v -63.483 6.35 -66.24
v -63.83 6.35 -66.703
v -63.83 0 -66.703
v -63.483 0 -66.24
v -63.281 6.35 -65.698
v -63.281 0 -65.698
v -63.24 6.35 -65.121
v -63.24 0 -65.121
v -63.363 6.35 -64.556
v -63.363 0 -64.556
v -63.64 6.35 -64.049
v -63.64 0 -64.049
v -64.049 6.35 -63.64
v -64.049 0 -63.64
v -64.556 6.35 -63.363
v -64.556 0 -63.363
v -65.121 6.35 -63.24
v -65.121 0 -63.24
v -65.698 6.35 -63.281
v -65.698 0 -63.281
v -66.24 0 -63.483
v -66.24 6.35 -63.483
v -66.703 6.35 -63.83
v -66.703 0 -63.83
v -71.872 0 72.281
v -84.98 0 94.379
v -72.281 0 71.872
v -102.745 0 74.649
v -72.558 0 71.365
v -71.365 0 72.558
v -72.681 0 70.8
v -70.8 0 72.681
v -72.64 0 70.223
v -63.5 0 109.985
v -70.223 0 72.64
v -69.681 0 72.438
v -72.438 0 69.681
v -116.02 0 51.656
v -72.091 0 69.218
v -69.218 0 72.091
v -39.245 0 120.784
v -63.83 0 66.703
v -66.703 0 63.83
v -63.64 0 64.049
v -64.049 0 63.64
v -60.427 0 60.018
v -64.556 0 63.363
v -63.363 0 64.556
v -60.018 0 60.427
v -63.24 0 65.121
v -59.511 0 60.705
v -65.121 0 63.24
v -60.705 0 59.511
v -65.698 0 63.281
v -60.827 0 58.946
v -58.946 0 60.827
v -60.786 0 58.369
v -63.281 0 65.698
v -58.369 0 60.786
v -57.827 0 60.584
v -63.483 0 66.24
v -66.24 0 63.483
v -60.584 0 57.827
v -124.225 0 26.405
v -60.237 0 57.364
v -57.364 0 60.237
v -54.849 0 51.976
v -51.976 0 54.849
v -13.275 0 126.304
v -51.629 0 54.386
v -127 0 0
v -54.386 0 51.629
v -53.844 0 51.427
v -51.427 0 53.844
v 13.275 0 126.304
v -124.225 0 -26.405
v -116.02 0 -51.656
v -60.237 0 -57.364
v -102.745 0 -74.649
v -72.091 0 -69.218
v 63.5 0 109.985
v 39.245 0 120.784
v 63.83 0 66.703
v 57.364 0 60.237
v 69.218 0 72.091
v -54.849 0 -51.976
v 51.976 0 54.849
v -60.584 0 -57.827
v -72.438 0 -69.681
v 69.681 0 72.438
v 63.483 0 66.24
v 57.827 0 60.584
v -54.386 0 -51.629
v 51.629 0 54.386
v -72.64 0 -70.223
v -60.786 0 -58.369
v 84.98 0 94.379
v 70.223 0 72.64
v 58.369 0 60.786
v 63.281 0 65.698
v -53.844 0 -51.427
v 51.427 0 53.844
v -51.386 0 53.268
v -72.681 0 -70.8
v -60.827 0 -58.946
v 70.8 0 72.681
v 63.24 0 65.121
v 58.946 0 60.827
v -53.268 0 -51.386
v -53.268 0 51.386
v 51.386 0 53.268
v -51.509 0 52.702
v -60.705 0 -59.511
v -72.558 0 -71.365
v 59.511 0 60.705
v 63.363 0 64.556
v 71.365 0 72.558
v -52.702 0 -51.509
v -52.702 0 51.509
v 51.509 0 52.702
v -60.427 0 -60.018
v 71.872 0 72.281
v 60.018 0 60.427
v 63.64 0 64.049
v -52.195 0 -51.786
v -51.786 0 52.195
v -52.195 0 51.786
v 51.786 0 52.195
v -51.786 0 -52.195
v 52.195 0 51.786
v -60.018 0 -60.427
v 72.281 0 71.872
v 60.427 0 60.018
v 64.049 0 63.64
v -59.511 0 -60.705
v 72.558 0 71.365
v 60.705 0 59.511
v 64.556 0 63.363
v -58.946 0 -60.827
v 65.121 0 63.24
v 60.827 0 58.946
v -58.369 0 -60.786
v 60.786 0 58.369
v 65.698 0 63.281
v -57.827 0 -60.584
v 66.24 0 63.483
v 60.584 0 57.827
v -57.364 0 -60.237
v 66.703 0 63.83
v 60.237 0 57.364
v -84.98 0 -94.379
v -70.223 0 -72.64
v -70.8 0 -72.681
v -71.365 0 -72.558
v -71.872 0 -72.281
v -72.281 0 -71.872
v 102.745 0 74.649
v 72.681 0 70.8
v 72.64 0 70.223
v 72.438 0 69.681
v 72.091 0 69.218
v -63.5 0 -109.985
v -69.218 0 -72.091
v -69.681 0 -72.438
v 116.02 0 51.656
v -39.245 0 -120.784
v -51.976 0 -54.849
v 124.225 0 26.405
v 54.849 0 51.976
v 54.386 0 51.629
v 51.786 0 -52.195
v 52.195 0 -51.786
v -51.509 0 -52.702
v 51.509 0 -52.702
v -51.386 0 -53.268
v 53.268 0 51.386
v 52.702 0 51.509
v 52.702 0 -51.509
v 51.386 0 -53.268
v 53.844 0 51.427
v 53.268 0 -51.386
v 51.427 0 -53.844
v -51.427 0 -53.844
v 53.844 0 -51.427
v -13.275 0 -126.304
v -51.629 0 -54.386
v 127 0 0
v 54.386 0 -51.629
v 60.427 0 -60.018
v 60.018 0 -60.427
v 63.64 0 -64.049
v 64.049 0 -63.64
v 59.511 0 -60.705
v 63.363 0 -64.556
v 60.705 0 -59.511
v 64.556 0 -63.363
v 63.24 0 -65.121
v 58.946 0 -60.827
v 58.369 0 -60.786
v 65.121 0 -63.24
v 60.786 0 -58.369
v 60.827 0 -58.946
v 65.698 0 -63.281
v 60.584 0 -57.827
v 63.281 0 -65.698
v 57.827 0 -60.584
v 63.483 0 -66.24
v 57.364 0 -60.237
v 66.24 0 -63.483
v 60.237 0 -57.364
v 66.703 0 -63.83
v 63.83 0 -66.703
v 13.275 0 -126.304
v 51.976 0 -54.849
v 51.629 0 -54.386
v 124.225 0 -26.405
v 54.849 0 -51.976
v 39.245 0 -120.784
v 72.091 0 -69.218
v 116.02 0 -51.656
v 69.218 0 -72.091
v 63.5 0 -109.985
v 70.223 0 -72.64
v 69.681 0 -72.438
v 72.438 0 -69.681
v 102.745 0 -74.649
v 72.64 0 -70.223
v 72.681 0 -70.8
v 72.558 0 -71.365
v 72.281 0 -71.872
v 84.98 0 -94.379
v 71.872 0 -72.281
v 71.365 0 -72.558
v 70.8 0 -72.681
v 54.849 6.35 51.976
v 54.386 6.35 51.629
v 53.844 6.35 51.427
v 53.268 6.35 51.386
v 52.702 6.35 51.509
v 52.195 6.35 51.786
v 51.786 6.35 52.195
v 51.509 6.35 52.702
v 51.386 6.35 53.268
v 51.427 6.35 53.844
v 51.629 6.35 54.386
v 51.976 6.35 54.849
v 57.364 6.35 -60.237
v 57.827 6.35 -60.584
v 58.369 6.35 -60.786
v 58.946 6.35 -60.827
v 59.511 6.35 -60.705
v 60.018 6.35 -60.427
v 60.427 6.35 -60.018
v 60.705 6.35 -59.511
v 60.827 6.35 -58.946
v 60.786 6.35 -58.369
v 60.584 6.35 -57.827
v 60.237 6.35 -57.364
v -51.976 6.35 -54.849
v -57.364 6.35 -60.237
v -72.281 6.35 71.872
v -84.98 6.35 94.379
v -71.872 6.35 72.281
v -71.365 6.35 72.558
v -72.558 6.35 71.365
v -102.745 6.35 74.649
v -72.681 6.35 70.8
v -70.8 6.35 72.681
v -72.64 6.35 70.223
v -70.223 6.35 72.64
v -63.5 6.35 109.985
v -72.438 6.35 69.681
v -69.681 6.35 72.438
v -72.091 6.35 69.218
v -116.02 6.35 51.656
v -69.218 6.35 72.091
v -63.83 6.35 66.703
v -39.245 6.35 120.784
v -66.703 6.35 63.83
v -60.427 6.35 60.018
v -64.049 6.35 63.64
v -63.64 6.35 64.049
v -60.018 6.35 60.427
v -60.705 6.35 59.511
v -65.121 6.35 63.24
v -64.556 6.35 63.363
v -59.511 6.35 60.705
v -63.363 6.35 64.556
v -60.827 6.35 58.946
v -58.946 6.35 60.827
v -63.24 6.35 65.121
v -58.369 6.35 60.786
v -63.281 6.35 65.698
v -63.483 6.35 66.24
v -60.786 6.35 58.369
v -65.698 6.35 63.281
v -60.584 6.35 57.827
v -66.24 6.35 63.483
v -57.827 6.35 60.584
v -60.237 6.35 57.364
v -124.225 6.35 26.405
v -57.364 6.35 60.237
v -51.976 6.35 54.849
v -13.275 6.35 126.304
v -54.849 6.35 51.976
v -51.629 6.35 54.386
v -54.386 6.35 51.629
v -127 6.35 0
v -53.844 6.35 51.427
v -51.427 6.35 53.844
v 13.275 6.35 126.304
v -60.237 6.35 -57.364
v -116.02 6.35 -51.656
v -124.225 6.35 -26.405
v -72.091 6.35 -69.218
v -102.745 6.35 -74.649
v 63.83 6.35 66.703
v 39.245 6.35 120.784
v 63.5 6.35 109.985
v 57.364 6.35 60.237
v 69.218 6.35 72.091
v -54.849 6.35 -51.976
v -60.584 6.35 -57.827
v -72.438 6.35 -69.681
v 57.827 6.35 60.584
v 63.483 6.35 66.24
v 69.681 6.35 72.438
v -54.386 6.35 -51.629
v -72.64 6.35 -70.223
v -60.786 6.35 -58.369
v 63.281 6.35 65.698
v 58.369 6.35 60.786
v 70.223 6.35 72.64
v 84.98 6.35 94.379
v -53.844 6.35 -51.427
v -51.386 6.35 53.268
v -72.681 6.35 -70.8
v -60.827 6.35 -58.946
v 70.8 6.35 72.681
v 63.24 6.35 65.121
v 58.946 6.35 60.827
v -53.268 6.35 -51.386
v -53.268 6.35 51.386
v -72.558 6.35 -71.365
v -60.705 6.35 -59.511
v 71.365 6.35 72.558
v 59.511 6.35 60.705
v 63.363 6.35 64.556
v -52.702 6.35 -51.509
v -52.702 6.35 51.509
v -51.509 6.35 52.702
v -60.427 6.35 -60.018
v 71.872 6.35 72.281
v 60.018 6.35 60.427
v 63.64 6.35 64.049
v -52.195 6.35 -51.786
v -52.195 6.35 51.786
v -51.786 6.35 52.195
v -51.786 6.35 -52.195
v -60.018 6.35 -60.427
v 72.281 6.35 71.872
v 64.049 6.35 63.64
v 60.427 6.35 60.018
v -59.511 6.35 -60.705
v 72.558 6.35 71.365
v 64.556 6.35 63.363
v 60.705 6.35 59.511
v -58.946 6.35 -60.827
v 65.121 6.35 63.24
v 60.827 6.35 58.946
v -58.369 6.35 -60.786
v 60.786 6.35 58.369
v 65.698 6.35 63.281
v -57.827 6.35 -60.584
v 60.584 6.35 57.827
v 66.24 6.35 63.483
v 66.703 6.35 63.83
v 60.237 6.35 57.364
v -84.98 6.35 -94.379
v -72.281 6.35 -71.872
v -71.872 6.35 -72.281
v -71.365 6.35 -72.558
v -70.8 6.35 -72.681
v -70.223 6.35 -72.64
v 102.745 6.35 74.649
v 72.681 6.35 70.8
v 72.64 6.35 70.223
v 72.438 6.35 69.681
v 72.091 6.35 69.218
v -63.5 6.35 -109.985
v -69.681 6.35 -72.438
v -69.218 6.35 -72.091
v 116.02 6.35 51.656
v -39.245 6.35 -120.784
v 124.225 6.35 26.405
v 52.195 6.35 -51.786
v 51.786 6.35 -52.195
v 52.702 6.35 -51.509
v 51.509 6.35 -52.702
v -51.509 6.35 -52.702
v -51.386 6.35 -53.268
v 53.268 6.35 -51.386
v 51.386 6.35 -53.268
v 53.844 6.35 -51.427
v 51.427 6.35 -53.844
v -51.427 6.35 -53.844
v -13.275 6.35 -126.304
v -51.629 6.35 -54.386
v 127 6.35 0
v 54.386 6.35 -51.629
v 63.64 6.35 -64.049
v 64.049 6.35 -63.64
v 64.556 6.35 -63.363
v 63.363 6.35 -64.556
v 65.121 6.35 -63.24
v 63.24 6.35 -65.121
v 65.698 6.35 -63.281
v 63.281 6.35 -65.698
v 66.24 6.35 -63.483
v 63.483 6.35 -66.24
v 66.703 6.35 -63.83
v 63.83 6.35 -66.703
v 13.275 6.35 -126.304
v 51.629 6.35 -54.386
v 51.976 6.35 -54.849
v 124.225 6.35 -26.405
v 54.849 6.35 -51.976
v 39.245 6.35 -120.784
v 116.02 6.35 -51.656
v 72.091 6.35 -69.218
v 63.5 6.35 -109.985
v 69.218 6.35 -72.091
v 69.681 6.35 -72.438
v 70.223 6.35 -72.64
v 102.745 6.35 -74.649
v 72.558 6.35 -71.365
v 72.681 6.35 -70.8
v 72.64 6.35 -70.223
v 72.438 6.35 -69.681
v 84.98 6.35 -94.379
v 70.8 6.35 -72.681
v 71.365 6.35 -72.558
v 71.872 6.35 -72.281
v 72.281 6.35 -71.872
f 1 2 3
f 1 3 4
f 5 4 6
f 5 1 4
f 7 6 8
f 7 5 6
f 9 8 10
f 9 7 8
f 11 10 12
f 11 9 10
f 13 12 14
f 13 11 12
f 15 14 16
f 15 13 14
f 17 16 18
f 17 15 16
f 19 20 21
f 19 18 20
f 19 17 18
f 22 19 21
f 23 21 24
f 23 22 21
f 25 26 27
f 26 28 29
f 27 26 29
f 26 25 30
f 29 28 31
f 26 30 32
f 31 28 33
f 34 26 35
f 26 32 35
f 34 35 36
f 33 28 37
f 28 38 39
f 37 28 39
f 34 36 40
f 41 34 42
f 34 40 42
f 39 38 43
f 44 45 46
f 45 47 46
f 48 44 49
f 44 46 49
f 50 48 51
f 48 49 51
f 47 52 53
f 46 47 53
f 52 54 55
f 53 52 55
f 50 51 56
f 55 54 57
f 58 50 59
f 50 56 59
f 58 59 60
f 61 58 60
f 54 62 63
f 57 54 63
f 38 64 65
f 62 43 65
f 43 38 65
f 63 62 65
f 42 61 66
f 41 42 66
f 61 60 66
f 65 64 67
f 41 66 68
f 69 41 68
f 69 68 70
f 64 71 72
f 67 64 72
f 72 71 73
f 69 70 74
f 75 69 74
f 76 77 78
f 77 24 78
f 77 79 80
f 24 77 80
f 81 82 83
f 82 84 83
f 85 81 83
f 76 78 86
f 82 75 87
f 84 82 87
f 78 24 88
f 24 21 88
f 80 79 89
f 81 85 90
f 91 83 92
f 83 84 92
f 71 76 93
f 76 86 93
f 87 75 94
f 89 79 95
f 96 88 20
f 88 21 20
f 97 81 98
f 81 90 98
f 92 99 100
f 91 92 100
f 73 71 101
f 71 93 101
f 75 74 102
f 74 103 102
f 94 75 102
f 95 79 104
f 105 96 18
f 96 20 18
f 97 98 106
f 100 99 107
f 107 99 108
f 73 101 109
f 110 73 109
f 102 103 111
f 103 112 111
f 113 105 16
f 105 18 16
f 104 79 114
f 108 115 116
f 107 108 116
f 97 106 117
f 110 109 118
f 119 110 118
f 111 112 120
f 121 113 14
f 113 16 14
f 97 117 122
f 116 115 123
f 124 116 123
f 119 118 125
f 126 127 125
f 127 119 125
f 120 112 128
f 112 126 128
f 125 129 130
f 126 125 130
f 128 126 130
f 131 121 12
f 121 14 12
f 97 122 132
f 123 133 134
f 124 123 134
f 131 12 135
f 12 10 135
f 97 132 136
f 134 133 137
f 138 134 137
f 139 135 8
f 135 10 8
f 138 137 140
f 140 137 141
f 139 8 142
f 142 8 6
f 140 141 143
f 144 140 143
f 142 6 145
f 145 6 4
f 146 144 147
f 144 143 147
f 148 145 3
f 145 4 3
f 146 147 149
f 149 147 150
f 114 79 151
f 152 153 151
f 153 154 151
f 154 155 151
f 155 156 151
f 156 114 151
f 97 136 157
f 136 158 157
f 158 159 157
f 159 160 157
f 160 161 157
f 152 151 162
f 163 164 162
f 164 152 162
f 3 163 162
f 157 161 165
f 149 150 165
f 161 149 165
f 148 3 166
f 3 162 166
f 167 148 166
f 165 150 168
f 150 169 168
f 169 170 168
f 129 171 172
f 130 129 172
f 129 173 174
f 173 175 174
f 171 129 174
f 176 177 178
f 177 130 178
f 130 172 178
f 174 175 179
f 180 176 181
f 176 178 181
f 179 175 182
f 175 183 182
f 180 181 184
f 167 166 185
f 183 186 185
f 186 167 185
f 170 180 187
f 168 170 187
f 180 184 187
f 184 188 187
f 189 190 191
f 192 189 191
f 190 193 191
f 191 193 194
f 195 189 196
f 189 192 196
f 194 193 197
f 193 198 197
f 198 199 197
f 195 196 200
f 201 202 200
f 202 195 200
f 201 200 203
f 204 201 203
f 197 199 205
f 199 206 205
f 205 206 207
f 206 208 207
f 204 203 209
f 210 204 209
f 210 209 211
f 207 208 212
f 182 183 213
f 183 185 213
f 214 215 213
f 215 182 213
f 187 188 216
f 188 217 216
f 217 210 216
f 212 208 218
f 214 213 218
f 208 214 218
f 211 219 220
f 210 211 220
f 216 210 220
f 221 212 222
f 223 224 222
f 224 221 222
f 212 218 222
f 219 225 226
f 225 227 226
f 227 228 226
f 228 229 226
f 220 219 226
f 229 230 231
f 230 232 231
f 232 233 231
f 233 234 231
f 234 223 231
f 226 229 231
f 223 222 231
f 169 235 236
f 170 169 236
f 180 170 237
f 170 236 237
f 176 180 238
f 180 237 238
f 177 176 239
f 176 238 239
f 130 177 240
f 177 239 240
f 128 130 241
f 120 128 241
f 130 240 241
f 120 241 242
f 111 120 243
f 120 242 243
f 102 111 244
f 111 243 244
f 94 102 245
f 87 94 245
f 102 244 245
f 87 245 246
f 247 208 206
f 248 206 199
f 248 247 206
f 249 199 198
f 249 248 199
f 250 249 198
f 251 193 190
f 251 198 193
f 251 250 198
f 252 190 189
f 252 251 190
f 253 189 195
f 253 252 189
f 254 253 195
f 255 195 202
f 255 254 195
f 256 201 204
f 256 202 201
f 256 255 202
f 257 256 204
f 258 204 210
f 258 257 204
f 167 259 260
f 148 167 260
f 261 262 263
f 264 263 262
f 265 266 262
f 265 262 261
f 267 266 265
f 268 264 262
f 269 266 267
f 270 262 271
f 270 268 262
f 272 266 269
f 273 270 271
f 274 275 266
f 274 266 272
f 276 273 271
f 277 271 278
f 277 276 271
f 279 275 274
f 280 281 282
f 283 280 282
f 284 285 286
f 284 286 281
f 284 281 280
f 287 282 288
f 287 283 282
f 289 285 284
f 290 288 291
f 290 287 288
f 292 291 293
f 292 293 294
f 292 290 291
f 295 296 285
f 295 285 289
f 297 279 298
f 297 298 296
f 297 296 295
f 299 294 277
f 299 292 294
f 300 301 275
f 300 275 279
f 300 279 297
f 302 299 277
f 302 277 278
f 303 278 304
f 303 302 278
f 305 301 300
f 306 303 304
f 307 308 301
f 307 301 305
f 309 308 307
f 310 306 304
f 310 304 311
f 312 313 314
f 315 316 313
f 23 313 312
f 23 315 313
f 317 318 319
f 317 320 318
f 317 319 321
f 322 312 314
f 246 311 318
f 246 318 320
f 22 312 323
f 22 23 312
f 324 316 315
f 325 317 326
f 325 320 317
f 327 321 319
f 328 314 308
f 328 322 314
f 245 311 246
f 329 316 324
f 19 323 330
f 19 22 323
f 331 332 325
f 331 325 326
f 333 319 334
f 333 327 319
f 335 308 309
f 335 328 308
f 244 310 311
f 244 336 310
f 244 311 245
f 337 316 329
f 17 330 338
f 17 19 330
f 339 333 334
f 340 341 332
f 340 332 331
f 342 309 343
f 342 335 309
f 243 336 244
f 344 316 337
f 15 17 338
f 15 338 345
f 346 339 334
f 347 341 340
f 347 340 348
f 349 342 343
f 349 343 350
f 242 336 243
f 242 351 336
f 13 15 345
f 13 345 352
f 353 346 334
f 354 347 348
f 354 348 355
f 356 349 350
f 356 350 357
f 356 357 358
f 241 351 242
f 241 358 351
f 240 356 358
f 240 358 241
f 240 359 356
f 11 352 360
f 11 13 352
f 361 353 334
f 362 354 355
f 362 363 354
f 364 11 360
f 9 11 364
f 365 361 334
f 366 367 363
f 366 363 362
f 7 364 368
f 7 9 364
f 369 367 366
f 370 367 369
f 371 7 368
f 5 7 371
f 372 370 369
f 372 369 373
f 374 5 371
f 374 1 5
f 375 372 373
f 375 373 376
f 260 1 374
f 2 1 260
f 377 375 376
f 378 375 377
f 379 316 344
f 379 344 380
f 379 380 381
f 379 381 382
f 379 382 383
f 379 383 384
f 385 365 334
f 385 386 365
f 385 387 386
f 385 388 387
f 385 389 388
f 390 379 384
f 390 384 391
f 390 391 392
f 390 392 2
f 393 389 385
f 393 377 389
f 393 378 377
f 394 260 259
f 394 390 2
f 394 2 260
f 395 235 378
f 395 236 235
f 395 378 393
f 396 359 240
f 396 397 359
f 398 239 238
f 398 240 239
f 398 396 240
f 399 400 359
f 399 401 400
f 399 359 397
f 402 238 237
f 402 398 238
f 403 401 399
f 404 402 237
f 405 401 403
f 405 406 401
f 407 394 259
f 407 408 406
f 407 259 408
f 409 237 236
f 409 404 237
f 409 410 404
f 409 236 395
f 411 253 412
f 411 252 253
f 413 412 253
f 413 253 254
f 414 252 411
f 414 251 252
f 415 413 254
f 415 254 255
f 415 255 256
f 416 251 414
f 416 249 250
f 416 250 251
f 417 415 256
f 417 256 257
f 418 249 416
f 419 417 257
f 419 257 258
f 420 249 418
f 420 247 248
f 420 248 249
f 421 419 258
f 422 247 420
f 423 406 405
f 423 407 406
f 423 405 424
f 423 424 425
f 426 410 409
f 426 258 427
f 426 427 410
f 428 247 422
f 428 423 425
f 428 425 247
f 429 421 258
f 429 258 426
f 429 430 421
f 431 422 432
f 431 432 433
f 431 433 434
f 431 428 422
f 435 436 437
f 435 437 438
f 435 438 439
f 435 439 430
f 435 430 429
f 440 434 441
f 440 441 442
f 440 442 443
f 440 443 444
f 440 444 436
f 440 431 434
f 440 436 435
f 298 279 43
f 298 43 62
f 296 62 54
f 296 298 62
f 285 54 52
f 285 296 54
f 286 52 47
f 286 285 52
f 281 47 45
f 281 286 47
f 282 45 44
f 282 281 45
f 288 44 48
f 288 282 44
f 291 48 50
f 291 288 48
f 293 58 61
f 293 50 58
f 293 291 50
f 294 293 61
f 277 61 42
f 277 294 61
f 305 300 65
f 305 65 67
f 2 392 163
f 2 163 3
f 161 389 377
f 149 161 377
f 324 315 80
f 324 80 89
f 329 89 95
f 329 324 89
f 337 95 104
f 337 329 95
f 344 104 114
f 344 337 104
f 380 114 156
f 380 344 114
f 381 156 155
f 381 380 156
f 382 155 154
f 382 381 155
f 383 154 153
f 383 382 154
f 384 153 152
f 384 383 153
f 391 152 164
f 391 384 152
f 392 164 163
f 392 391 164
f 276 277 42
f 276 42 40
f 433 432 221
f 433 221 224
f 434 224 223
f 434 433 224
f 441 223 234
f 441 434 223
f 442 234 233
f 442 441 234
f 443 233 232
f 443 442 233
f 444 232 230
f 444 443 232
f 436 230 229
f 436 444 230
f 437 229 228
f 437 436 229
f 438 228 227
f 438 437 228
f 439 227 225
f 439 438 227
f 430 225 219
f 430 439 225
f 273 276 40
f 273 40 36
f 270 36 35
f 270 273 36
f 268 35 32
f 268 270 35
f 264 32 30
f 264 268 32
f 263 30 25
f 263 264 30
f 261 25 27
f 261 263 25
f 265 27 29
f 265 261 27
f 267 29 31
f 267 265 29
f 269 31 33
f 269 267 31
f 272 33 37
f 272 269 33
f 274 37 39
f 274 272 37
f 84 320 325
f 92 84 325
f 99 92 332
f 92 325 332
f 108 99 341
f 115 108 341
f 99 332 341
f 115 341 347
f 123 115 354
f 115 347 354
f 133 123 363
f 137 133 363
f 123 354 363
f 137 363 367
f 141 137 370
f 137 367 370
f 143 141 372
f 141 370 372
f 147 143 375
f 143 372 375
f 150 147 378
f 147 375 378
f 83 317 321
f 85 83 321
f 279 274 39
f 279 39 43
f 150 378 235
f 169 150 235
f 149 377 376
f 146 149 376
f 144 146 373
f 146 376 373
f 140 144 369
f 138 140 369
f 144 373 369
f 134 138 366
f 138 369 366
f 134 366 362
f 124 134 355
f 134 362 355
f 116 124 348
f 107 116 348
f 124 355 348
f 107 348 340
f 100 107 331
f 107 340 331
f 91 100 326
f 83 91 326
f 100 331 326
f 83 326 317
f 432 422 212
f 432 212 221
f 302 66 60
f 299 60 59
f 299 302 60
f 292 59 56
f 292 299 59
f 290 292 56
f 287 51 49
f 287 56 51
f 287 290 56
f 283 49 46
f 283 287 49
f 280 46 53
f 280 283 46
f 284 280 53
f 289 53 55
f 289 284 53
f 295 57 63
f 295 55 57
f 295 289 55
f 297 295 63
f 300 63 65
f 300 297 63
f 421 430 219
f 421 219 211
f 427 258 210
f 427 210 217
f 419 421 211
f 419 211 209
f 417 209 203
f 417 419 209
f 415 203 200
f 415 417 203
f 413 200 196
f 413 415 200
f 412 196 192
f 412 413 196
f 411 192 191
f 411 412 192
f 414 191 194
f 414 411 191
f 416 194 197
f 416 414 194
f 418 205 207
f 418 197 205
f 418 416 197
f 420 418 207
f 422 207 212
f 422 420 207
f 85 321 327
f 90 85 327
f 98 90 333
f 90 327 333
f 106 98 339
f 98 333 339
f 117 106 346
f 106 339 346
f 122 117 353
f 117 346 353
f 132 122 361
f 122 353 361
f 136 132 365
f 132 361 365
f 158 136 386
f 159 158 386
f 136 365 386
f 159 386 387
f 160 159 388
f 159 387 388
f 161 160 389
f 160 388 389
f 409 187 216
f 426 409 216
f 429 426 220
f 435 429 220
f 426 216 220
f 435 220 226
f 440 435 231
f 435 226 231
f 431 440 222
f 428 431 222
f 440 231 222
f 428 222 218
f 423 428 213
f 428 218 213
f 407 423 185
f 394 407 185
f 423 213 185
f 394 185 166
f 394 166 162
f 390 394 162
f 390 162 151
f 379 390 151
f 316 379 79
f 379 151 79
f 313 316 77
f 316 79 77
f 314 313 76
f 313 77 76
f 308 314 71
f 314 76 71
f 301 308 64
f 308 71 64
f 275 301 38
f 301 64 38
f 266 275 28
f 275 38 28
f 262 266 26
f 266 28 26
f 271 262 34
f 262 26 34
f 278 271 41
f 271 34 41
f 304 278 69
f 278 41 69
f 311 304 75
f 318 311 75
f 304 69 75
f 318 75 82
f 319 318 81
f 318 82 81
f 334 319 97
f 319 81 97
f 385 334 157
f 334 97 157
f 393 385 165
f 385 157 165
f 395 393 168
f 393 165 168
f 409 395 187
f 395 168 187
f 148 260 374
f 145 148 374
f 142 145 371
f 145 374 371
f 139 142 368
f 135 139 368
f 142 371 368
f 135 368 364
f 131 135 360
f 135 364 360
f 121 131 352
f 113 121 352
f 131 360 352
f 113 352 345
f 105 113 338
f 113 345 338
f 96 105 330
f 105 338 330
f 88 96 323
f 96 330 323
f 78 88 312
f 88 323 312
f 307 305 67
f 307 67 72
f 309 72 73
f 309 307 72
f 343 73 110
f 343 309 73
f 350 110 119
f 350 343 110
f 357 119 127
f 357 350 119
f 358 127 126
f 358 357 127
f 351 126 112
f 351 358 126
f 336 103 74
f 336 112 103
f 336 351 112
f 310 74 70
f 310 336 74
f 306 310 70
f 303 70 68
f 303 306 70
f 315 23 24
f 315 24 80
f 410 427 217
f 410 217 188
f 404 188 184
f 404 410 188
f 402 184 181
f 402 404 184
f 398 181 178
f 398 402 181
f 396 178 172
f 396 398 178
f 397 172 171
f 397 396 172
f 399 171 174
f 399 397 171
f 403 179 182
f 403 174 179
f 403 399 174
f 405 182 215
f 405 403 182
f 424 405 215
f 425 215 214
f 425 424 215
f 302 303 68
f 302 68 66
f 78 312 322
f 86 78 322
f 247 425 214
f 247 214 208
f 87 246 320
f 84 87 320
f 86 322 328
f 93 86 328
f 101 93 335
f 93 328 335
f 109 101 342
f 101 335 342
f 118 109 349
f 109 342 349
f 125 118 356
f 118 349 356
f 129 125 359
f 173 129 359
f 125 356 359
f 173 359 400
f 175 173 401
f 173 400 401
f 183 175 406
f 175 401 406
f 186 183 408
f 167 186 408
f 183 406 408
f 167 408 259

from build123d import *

# Parameters (mm, degrees)
SKETCH1_R           = 127
BOSS_EXTRUDE1_DEPTH = 6.35
CUT_EXTRUDE1_DEPTH  = 7.35


with BuildPart() as part:
    # Sketch1 → Boss-Extrude1 (new body)
    with BuildSketch(Plane(origin=(0, 0, 0), x_dir=(1, 0, 0), z_dir=(0, 1, 0))):
        Circle(SKETCH1_R)
    extrude(amount=BOSS_EXTRUDE1_DEPTH)

    # Sketch2 → Cut-Extrude1 (cut, through all)
    with BuildSketch(Plane(origin=(0, 6.35, 0), x_dir=(1, 0, 0), z_dir=(0, 1, 0))):
        with BuildLine():
            Line((-60.237491978, 57.363810019), (-54.849338305, 51.975656347))
            ThreePointArc((-54.849338305, 51.975656347), (-51.975656347, 51.975656347), (-51.975656347, 54.849338305))
            Line((-51.975656347, 54.849338305), (-57.363810019, 60.237491978))
            ThreePointArc((-57.363810019, 60.237491978), (-60.237491978, 60.237491978), (-60.237491978, 57.363810019))
        make_face()
        with BuildLine():
            ThreePointArc((54.849338305, 51.975656347), (51.975656347, 51.975656347), (51.975656347, 54.849338305))
            Line((51.975656347, 54.849338305), (57.363810019, 60.237491978))
            ThreePointArc((57.363810019, 60.237491978), (60.237491978, 60.237491978), (60.237491978, 57.363810019))
            Line((60.237491978, 57.363810019), (54.849338305, 51.975656347))
        make_face()
        with BuildLine():
            ThreePointArc((66.703276385, 63.829594426), (63.829594426, 63.829594426), (63.829594426, 66.703276385))
            Line((63.829594426, 66.703276385), (69.217748099, 72.091430058))
            ThreePointArc((69.217748099, 72.091430058), (72.091430058, 72.091430058), (72.091430058, 69.217748099))
            Line((72.091430058, 69.217748099), (66.703276385, 63.829594426))
        make_face()
        with BuildLine():
            Line((60.237491978, -57.363810019), (54.849338305, -51.975656347))
            ThreePointArc((54.849338305, -51.975656347), (51.975656347, -51.975656347), (51.975656347, -54.849338305))
            Line((51.975656347, -54.849338305), (57.363810019, -60.237491978))
            ThreePointArc((57.363810019, -60.237491978), (60.237491978, -60.237491978), (60.237491978, -57.363810019))
        make_face()
        with BuildLine():
            Line((72.091430058, -69.217748099), (66.703276385, -63.829594426))
            ThreePointArc((66.703276385, -63.829594426), (63.829594426, -63.829594426), (63.829594426, -66.703276385))
            Line((63.829594426, -66.703276385), (69.217748099, -72.091430058))
            ThreePointArc((69.217748099, -72.091430058), (72.091430058, -72.091430058), (72.091430058, -69.217748099))
        make_face()
        with BuildLine():
            ThreePointArc((-54.849338305, -51.975656347), (-51.975656347, -51.975656347), (-51.975656347, -54.849338305))
            Line((-51.975656347, -54.849338305), (-57.363810019, -60.237491978))
            ThreePointArc((-57.363810019, -60.237491978), (-60.237491978, -60.237491978), (-60.237491978, -57.363810019))
            Line((-60.237491978, -57.363810019), (-54.849338305, -51.975656347))
        make_face()
        with BuildLine():
            ThreePointArc((-66.703276385, -63.829594426), (-63.829594426, -63.829594426), (-63.829594426, -66.703276385))
            Line((-63.829594426, -66.703276385), (-69.217748099, -72.091430058))
            ThreePointArc((-69.217748099, -72.091430058), (-72.091430058, -72.091430058), (-72.091430058, -69.217748099))
            Line((-72.091430058, -69.217748099), (-66.703276385, -63.829594426))
        make_face()
        with BuildLine():
            Line((-69.217748099, 72.091430058), (-63.829594426, 66.703276385))
            ThreePointArc((-63.829594426, 66.703276385), (-63.829594426, 63.829594426), (-66.703276385, 63.829594426))
            Line((-66.703276385, 63.829594426), (-72.091430058, 69.217748099))
            ThreePointArc((-72.091430058, 69.217748099), (-72.091430058, 72.091430058), (-69.217748099, 72.091430058))
        make_face()
    extrude(amount=-CUT_EXTRUDE1_DEPTH, mode=Mode.SUBTRACT)


solid = part.part
